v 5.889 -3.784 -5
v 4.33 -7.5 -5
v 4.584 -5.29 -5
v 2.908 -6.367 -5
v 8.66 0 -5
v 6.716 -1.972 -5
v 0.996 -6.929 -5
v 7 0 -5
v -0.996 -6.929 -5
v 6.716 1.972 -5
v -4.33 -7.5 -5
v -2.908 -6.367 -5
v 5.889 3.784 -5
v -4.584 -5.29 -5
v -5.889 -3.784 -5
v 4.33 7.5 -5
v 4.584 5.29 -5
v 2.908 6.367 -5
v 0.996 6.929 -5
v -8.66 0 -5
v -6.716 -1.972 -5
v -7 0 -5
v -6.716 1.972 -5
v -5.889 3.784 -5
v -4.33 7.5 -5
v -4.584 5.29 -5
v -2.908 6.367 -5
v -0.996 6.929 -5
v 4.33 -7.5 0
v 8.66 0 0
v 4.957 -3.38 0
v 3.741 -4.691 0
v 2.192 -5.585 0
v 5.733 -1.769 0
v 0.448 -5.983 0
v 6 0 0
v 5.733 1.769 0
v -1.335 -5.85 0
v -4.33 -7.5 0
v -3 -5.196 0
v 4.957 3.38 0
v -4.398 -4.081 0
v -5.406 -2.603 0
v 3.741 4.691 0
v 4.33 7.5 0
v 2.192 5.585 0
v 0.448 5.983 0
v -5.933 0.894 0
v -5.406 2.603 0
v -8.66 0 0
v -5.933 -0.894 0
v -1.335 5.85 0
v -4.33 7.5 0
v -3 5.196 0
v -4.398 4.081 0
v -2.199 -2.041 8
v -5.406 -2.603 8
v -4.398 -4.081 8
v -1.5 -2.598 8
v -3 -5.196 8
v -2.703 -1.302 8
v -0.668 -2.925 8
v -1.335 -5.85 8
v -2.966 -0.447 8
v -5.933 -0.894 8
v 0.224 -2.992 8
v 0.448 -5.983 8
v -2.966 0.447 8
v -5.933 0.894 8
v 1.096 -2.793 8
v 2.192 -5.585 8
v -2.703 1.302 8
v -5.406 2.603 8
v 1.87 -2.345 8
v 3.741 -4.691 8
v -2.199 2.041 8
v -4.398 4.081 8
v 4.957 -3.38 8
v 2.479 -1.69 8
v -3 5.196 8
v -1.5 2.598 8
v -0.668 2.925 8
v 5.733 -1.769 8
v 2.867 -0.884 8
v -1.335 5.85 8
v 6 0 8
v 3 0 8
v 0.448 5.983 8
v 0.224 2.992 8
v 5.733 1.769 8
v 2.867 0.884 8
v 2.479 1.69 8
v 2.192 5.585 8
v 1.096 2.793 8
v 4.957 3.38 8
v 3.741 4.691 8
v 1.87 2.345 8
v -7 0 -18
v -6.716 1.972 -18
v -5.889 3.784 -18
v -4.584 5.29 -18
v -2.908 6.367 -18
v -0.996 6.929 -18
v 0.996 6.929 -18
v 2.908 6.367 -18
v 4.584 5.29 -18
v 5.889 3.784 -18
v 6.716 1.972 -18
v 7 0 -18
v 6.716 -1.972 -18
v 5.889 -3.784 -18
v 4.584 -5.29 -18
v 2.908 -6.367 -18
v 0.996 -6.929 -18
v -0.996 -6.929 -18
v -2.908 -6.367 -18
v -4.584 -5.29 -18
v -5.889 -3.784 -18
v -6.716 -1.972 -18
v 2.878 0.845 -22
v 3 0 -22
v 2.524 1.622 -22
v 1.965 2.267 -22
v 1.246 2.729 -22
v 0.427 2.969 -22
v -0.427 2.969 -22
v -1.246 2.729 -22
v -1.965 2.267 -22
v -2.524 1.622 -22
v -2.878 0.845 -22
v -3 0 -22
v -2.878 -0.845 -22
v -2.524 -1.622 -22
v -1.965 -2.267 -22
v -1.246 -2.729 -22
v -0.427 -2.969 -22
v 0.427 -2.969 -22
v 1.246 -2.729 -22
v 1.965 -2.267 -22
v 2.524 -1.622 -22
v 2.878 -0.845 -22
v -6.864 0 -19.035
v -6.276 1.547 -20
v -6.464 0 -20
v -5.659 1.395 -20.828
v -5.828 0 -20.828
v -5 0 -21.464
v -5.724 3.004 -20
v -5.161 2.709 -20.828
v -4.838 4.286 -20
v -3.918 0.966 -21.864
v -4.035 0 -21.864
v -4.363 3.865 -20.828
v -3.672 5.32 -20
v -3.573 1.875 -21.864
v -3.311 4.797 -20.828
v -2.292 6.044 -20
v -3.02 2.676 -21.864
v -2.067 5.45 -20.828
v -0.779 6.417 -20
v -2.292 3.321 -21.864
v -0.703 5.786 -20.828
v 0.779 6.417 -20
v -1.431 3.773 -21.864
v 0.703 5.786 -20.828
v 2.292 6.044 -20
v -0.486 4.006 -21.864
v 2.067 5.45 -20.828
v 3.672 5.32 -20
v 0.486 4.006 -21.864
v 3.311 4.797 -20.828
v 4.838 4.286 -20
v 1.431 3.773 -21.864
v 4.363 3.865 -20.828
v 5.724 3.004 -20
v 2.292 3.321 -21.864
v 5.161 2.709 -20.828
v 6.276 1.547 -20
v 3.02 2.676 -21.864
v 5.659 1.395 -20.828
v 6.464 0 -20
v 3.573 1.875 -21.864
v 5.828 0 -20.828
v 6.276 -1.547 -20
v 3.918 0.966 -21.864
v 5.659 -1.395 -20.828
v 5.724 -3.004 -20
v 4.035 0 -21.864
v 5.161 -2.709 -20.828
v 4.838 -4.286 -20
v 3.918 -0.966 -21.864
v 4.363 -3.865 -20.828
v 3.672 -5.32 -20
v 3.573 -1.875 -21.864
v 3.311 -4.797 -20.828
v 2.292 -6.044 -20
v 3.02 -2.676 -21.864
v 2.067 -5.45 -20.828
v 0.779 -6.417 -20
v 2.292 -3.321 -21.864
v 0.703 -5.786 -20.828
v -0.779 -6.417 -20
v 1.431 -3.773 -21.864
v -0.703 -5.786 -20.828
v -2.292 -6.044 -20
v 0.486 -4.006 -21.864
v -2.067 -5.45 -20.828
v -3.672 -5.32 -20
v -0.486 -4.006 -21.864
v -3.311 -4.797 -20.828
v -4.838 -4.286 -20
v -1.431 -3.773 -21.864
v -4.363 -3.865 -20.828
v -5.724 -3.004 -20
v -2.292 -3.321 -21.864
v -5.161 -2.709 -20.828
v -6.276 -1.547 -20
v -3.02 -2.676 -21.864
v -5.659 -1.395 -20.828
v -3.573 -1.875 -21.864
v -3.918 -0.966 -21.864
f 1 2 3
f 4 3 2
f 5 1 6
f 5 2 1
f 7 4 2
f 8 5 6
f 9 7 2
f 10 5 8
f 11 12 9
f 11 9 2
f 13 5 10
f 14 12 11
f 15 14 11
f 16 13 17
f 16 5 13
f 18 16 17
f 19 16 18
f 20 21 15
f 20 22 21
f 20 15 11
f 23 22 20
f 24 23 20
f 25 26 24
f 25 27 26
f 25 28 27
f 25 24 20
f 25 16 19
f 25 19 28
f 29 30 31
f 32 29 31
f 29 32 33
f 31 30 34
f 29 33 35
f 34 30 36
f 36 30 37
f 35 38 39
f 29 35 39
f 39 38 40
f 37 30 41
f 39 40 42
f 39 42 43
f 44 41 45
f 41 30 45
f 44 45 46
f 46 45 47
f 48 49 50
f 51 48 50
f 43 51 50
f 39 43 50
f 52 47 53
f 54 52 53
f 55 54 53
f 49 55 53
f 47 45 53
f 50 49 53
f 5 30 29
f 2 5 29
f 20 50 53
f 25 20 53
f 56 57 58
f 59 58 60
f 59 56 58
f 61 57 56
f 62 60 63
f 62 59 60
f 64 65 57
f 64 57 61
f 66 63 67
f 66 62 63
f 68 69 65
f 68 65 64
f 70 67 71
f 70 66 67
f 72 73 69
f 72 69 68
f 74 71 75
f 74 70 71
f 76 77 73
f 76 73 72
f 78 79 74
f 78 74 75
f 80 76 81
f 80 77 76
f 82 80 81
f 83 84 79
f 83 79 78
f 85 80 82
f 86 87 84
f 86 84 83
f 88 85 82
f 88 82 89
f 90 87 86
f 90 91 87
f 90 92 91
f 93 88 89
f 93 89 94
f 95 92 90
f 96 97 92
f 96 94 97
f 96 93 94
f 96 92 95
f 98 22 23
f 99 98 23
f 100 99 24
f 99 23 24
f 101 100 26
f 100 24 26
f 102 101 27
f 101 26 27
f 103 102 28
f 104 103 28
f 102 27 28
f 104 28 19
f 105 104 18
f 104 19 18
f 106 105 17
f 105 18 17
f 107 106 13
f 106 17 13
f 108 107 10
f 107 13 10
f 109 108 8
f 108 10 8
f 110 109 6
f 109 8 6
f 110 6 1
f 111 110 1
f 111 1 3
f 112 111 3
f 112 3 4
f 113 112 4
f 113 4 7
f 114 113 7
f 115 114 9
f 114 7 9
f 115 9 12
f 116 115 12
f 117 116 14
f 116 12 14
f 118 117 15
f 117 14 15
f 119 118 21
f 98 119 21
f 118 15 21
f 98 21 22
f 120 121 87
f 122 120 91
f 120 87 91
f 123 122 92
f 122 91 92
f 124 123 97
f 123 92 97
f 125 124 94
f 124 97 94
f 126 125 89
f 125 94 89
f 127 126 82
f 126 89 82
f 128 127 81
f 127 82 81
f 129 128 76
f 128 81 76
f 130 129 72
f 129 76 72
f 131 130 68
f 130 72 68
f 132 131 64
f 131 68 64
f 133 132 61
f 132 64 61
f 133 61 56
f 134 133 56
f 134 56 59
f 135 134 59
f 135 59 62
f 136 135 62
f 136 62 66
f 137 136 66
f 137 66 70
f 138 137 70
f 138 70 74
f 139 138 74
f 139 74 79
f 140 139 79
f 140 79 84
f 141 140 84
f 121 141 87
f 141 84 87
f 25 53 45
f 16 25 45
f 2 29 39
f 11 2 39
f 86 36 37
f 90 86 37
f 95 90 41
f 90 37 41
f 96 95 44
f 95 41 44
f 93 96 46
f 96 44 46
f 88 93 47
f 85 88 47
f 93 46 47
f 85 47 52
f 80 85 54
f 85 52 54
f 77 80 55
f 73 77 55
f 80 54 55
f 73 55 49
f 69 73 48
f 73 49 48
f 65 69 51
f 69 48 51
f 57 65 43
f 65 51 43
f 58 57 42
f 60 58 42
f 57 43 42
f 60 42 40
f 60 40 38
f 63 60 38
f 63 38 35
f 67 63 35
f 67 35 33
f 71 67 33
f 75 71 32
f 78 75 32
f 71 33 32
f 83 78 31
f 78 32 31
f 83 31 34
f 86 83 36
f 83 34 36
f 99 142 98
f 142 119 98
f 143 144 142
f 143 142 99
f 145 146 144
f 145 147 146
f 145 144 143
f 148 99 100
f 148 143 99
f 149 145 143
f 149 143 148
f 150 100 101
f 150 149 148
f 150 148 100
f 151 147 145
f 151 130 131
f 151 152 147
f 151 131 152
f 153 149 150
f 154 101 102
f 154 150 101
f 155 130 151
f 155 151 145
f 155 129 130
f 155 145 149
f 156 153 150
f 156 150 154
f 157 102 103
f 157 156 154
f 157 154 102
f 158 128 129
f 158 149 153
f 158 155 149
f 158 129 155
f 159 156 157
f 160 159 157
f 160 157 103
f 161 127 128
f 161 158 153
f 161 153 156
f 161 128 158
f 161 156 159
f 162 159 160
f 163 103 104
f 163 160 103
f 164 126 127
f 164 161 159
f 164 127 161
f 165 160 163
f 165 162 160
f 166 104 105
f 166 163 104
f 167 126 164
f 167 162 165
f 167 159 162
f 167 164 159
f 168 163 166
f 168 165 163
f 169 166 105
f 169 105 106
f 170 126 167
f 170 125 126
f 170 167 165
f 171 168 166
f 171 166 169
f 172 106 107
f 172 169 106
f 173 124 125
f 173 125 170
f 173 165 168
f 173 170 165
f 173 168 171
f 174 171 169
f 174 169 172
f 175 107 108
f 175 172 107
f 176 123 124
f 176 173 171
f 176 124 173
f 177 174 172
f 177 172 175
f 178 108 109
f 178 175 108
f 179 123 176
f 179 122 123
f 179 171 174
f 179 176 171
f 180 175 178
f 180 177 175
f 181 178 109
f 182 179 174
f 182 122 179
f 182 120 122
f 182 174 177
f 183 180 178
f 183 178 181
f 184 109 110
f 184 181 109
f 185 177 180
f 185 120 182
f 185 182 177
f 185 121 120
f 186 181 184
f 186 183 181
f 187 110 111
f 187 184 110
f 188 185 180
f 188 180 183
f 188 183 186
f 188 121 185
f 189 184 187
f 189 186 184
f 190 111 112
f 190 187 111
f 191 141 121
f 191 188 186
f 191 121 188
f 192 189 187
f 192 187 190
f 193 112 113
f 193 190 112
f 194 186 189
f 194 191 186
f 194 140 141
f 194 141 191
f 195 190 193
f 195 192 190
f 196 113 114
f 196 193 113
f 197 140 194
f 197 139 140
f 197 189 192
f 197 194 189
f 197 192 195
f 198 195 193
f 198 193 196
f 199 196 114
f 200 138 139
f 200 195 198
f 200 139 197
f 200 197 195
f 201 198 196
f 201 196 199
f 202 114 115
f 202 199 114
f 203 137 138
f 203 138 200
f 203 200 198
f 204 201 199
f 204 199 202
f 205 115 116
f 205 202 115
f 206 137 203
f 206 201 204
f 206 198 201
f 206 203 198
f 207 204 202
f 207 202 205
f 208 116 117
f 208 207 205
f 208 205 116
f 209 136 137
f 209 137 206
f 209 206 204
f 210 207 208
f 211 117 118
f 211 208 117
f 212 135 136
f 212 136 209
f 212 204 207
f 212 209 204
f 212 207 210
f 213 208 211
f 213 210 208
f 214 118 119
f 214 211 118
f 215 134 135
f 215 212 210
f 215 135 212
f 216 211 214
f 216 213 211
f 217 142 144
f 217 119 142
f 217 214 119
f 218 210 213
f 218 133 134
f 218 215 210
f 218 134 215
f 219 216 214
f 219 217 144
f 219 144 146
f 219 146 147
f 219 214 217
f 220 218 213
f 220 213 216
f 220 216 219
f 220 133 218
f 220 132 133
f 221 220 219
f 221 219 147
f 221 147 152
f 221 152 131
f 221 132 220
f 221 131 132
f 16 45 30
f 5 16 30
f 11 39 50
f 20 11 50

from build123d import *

# Parameters (mm, degrees)
SKICA1_R                 = 6
P_IDAT_VYSUNUT_M1_DEPTH  = 8
P_IDAT_VYSUNUT_M2_DEPTH  = 5
SKICA3_R                 = 7
P_IDAT_VYSUNUT_M3_DEPTH  = 17
ZAOBLIT1_R               = 4
SKICA4_R                 = 3
ODEBRAT_VYSUNUT_M1_DEPTH = 33.113081447


with BuildPart() as part:
    # Skica1 → Přidat vysunutím1 (new body)
    with BuildSketch(Plane.XY):
        Circle(SKICA1_R)
    extrude(amount=P_IDAT_VYSUNUT_M1_DEPTH)

    # Skica2 → Přidat vysunutím2 (add)
    with BuildSketch(Plane(origin=(0, 0, 0), x_dir=(-1, 0, 0), z_dir=(0, 0, -1))):
        Polygon((4.330127019, -7.5), (8.660254038, 0), (4.330127019, 7.5), (-4.330127019, 7.5), (-8.660254038, 0), (-4.330127019, -7.5), align=None)
    extrude(amount=P_IDAT_VYSUNUT_M2_DEPTH)

    # Skica3 → Přidat vysunutím3 (add)
    with BuildSketch(Plane(origin=(0, 0, -5), x_dir=(-1, 0, 0), z_dir=(0, 0, -1))):
        Circle(SKICA3_R)
    extrude(amount=P_IDAT_VYSUNUT_M3_DEPTH)

    # Zaoblit1
    zaoblit1_edges = [part.edges().sort_by_distance(p)[0] for p in [
        (7, 0, -22),
    ]]
    fillet(zaoblit1_edges, radius=ZAOBLIT1_R)

    # Skica4 → Odebrat vysunutím1 (cut, through all)
    with BuildSketch(Plane.XY.offset(8)):
        Circle(SKICA4_R)
    extrude(amount=-ODEBRAT_VYSUNUT_M1_DEPTH, mode=Mode.SUBTRACT)


solid = part.part
